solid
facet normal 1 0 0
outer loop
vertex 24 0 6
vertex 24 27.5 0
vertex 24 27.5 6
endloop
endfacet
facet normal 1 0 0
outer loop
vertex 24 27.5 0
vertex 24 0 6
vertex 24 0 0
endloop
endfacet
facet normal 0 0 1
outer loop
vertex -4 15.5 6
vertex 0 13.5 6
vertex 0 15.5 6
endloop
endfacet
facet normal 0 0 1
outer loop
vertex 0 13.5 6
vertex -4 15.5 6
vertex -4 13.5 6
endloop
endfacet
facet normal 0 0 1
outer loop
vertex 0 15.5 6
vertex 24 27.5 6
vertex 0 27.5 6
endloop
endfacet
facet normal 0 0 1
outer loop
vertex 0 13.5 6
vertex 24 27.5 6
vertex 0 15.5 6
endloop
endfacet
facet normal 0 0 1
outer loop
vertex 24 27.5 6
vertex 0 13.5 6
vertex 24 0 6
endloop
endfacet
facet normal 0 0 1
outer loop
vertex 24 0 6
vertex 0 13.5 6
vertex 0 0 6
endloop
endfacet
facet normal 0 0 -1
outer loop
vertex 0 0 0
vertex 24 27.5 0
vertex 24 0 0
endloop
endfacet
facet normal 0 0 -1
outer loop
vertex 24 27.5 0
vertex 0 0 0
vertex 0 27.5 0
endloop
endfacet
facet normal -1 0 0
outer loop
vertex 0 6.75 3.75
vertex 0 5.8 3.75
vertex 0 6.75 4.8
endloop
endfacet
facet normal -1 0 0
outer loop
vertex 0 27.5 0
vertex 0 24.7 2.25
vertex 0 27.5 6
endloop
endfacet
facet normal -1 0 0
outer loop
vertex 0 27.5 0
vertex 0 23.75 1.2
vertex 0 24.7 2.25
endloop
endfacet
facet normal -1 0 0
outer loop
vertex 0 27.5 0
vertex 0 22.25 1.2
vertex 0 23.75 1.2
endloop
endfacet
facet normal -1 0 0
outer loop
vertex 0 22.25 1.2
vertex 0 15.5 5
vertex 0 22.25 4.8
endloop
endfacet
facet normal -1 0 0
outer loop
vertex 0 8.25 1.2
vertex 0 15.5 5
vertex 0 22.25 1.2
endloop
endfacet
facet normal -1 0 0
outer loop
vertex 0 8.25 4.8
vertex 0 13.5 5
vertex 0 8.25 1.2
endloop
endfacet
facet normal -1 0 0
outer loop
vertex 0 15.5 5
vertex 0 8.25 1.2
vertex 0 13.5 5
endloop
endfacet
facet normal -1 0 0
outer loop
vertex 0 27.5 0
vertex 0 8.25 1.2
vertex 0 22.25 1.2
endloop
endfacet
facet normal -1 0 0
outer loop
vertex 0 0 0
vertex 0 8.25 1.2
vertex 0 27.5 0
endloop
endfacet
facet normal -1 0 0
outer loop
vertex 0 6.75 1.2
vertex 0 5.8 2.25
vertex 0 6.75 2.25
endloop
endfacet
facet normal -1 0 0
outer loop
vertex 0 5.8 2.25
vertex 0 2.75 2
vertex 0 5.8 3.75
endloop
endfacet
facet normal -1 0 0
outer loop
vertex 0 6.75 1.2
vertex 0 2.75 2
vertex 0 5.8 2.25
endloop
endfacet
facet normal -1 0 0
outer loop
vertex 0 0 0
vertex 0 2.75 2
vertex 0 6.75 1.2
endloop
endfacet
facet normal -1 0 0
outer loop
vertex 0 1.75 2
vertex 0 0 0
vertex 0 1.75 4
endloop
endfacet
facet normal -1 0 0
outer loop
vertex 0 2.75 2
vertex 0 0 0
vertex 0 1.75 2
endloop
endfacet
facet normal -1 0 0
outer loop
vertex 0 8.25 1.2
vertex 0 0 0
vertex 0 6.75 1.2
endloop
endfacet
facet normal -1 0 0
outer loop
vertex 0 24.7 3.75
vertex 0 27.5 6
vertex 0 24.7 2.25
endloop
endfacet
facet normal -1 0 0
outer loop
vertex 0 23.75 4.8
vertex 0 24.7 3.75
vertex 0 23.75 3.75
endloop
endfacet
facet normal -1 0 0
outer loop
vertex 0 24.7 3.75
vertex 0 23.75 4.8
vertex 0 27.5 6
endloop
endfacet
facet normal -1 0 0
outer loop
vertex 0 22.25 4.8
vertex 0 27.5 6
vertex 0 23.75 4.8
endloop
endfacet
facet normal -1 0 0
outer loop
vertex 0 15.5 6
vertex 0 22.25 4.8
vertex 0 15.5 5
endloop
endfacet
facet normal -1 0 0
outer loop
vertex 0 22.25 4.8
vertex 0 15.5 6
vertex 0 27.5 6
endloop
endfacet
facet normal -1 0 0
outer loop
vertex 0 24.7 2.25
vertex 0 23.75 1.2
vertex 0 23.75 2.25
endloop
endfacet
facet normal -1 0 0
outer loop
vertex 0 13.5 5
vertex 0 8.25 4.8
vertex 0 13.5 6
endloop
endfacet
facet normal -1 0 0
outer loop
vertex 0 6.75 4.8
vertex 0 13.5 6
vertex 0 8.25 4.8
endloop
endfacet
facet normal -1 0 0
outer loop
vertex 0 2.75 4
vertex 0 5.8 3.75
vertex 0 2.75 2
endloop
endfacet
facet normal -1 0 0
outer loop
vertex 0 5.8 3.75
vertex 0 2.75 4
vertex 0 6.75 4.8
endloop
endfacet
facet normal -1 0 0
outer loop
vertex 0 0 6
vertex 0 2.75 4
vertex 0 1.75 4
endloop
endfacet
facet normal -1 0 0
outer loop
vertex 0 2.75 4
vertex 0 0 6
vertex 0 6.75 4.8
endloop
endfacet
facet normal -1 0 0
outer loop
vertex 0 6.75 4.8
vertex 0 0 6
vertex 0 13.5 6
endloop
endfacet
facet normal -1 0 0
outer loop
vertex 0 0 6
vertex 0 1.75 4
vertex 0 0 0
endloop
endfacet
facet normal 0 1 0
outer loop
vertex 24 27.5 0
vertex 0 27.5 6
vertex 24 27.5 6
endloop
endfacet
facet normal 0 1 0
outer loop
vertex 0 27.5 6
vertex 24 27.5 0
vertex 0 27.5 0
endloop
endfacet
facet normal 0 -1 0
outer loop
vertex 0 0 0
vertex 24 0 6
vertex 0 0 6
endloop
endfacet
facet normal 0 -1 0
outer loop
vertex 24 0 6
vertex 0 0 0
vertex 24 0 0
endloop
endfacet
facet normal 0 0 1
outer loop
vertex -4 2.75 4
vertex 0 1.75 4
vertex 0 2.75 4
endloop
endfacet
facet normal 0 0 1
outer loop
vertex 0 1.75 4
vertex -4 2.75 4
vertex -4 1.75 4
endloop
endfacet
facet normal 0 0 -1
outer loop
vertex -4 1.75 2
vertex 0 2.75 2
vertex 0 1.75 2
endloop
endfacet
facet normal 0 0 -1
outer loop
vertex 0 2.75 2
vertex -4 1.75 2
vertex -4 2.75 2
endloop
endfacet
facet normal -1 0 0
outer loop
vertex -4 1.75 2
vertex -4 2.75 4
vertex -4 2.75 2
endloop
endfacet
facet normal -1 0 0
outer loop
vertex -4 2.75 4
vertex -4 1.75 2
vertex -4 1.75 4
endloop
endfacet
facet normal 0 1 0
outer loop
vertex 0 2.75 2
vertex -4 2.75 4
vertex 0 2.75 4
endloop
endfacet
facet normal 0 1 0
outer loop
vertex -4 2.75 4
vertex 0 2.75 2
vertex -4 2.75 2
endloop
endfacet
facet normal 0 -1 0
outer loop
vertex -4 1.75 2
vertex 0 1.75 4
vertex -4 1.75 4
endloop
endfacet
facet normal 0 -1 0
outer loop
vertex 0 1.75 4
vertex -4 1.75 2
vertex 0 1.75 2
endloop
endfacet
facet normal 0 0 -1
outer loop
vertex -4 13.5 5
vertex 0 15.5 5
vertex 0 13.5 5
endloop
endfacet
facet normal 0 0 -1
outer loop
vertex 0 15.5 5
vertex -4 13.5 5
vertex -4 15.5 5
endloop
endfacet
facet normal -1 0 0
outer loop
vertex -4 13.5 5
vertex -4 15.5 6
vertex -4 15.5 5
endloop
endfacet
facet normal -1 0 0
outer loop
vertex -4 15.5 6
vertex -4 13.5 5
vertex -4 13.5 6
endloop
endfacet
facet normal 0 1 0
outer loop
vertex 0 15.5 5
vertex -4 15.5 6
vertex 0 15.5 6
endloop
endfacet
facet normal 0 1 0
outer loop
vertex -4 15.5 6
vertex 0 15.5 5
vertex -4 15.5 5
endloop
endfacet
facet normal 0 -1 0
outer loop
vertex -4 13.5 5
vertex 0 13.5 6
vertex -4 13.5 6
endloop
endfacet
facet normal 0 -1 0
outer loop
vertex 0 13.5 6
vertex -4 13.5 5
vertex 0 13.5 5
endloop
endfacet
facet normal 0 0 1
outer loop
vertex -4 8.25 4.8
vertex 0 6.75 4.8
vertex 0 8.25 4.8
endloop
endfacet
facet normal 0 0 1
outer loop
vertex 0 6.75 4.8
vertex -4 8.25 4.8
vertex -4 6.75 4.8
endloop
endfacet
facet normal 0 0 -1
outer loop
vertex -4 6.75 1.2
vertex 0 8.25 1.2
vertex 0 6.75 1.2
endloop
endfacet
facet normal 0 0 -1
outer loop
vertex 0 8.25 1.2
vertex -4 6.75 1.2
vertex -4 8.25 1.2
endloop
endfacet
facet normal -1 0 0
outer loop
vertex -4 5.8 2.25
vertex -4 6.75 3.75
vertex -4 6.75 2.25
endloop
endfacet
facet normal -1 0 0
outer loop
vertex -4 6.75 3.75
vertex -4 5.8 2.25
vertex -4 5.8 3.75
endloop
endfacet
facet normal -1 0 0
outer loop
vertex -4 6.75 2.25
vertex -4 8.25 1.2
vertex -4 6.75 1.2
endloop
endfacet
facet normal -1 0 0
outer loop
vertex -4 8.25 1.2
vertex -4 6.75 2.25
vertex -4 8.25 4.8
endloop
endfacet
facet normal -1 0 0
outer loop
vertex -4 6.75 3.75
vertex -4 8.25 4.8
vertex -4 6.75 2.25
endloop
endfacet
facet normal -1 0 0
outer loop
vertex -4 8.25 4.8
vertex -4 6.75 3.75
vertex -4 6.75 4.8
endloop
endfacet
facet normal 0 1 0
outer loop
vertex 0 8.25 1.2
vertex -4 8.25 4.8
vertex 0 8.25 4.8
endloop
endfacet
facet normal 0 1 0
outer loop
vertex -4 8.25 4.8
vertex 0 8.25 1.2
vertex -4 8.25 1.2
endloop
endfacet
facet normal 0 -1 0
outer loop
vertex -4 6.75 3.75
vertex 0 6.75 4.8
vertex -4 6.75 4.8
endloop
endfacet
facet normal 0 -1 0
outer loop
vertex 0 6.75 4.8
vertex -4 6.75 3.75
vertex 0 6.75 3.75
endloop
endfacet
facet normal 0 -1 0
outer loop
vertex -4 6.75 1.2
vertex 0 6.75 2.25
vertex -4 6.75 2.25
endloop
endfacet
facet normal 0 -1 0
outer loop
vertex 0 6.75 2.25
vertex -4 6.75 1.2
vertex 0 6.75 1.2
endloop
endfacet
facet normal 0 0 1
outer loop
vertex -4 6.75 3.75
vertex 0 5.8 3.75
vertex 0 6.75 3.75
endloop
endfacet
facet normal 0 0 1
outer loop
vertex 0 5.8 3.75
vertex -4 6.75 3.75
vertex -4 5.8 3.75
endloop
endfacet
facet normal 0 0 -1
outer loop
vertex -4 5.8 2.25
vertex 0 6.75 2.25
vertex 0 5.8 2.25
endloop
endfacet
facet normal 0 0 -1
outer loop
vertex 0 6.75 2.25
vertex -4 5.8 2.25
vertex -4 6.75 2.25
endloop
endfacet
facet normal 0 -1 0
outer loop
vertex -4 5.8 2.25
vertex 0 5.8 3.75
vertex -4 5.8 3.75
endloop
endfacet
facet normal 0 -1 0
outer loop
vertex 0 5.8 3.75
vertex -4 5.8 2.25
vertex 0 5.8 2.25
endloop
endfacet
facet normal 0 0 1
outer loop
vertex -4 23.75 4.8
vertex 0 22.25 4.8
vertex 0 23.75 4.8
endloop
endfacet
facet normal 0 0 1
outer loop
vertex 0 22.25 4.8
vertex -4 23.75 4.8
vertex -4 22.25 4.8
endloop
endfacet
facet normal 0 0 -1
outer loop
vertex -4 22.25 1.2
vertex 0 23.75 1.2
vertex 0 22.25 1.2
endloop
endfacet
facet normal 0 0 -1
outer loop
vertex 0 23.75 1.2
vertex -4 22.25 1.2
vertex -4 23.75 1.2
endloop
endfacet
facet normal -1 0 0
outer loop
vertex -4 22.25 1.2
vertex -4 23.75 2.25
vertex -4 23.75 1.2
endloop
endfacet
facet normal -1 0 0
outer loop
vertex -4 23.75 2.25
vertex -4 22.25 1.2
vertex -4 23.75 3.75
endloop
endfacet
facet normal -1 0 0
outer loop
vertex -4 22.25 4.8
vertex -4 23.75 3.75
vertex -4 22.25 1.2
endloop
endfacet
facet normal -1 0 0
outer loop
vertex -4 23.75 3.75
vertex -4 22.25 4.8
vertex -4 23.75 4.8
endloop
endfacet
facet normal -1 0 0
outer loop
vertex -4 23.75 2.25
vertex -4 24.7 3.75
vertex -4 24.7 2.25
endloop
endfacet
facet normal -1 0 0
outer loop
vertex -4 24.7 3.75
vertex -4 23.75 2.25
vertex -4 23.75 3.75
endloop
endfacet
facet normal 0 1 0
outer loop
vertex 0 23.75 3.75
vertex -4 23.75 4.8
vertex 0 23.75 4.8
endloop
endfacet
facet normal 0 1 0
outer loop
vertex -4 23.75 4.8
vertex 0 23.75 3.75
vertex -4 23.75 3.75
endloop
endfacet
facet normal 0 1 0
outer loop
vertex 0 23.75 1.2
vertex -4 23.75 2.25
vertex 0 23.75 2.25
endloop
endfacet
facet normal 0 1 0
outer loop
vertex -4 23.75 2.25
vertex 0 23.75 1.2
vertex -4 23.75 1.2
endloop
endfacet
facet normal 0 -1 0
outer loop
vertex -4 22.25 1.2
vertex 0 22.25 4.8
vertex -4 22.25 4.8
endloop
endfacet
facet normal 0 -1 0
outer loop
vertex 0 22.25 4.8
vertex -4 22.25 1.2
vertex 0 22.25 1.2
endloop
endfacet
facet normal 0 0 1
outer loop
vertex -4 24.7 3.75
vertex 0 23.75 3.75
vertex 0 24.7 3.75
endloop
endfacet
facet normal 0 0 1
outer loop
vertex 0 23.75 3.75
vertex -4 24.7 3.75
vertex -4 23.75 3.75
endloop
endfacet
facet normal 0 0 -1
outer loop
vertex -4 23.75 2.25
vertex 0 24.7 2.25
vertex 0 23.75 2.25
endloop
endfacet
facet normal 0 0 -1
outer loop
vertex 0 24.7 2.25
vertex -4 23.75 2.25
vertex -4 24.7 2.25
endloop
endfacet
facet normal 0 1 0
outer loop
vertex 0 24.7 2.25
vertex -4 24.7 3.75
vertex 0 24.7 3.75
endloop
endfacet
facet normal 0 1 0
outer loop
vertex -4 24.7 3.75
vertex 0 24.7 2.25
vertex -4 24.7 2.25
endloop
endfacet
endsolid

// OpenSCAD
module Battery_holder(){

color("Grey")cube([24, 27.5,6]);
translate([-4,1.75,3-2/2])cube([4,1, 2]); // contact cathode
translate([-4,13.5,6-1])cube([4, 2,1]); // contact anode

translate([-4,6.75,6/2-3.6/2])cube([4, 1.5, 3.6]); // peg 1
translate([-4,7-2.2+1,6/2-.75])cube([4, 2.2, 1.5]); // peg 1 

translate([-4,7+14.5+.75,6/2-3.6/2])cube([4, 1.5, 3.6]); // peg 1
translate([-4,7+14.5+1,6/2-.75])cube([4, 2.2, 1.5]); // peg 1 
}

Battery_holder(); 
